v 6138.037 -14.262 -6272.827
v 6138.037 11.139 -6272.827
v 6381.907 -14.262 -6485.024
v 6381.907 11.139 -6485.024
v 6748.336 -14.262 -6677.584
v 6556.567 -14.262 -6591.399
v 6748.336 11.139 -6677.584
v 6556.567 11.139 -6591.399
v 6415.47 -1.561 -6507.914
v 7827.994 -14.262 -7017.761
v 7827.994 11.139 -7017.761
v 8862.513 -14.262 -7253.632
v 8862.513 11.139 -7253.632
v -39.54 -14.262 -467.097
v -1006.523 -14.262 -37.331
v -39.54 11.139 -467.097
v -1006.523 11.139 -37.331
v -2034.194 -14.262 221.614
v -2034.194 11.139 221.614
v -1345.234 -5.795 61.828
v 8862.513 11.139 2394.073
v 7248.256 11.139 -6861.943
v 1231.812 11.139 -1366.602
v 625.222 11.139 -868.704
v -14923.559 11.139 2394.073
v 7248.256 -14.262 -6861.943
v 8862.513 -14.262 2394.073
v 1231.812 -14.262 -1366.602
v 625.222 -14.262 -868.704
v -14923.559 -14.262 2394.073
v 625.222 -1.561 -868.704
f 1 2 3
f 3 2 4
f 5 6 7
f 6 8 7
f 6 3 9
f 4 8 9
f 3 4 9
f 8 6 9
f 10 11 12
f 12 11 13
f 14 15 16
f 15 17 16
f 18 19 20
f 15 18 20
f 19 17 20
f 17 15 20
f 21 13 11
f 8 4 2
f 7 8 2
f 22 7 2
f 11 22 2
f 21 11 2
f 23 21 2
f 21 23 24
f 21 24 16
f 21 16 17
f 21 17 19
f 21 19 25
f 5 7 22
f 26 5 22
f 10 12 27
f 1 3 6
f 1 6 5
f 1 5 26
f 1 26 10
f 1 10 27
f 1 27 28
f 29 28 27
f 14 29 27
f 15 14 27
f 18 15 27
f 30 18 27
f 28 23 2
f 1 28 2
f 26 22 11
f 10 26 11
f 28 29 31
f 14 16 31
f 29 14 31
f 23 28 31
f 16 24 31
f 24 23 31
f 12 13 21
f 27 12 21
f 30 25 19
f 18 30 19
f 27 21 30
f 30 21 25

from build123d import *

# Parameters (mm, degrees)
BOSS_EXTRUDE2_DEPTH = 3.122929072
SCALE6_SCALE        = 8.1338973


with BuildPart() as part:
    # Sketch2 → Boss-Extrude2 (new body)
    with BuildSketch(Plane(origin=(0, 0, 0), x_dir=(1, 0, 0), z_dir=(0, 1, 0))):
        with BuildLine():
            Line((629.731048782, 277.215341973), (2214.379276625, 544.302389928))
            add(Edge.make_bspline(
                [(2214.379276625, 544.302389928), (2299.493055017, 561.920373013), (2384.440773399, 583.354771284), (2459.606558912, 628.974080467)],
                knots=[0, 0, 0, 0, 1, 1, 1, 1], degree=3))
            add(Edge.make_bspline(
                [(2459.606558912, 628.974080467), (2544.909830443, 672.429611603), (2615.909467864, 739.561267492)],
                knots=[0, 0, 0, 1, 1, 1], degree=2))
            Line((2615.909467864, 739.561267492), (3219.092035195, 1342.743834824))
            add(Edge.make_bspline(
                [(3219.092035195, 1342.743834824), (3249.792852386, 1375.667285093), (3294.123612778, 1392.505641268)],
                knots=[0, 0, 0, 1, 1, 1], degree=2))
            Line((3294.123612778, 1392.505641268), (3355.584917995, 1415.171147477))
            Line((3355.584917995, 1415.171147477), (3426.859238384, 1434.327823377))
            Line((3426.859238384, 1434.327823377), (3554.045415638, 1463.32634757))
            Line((3554.045415638, 1463.32634757), (3554.045415638, 277.215341973))
            Line((3554.045415638, 277.215341973), (629.731048782, 277.215341973))
        make_face()
    extrude(amount=-BOSS_EXTRUDE2_DEPTH)


with BuildPart() as part_1:
    # Scale6: scaled about (2809.926509229, -1.561464536, -651.665359315)
    add(part.part.scale(SCALE6_SCALE).moved(Location((-20045.727137387, 11.139327637, 4648.913747321))))


solid = part_1.part
